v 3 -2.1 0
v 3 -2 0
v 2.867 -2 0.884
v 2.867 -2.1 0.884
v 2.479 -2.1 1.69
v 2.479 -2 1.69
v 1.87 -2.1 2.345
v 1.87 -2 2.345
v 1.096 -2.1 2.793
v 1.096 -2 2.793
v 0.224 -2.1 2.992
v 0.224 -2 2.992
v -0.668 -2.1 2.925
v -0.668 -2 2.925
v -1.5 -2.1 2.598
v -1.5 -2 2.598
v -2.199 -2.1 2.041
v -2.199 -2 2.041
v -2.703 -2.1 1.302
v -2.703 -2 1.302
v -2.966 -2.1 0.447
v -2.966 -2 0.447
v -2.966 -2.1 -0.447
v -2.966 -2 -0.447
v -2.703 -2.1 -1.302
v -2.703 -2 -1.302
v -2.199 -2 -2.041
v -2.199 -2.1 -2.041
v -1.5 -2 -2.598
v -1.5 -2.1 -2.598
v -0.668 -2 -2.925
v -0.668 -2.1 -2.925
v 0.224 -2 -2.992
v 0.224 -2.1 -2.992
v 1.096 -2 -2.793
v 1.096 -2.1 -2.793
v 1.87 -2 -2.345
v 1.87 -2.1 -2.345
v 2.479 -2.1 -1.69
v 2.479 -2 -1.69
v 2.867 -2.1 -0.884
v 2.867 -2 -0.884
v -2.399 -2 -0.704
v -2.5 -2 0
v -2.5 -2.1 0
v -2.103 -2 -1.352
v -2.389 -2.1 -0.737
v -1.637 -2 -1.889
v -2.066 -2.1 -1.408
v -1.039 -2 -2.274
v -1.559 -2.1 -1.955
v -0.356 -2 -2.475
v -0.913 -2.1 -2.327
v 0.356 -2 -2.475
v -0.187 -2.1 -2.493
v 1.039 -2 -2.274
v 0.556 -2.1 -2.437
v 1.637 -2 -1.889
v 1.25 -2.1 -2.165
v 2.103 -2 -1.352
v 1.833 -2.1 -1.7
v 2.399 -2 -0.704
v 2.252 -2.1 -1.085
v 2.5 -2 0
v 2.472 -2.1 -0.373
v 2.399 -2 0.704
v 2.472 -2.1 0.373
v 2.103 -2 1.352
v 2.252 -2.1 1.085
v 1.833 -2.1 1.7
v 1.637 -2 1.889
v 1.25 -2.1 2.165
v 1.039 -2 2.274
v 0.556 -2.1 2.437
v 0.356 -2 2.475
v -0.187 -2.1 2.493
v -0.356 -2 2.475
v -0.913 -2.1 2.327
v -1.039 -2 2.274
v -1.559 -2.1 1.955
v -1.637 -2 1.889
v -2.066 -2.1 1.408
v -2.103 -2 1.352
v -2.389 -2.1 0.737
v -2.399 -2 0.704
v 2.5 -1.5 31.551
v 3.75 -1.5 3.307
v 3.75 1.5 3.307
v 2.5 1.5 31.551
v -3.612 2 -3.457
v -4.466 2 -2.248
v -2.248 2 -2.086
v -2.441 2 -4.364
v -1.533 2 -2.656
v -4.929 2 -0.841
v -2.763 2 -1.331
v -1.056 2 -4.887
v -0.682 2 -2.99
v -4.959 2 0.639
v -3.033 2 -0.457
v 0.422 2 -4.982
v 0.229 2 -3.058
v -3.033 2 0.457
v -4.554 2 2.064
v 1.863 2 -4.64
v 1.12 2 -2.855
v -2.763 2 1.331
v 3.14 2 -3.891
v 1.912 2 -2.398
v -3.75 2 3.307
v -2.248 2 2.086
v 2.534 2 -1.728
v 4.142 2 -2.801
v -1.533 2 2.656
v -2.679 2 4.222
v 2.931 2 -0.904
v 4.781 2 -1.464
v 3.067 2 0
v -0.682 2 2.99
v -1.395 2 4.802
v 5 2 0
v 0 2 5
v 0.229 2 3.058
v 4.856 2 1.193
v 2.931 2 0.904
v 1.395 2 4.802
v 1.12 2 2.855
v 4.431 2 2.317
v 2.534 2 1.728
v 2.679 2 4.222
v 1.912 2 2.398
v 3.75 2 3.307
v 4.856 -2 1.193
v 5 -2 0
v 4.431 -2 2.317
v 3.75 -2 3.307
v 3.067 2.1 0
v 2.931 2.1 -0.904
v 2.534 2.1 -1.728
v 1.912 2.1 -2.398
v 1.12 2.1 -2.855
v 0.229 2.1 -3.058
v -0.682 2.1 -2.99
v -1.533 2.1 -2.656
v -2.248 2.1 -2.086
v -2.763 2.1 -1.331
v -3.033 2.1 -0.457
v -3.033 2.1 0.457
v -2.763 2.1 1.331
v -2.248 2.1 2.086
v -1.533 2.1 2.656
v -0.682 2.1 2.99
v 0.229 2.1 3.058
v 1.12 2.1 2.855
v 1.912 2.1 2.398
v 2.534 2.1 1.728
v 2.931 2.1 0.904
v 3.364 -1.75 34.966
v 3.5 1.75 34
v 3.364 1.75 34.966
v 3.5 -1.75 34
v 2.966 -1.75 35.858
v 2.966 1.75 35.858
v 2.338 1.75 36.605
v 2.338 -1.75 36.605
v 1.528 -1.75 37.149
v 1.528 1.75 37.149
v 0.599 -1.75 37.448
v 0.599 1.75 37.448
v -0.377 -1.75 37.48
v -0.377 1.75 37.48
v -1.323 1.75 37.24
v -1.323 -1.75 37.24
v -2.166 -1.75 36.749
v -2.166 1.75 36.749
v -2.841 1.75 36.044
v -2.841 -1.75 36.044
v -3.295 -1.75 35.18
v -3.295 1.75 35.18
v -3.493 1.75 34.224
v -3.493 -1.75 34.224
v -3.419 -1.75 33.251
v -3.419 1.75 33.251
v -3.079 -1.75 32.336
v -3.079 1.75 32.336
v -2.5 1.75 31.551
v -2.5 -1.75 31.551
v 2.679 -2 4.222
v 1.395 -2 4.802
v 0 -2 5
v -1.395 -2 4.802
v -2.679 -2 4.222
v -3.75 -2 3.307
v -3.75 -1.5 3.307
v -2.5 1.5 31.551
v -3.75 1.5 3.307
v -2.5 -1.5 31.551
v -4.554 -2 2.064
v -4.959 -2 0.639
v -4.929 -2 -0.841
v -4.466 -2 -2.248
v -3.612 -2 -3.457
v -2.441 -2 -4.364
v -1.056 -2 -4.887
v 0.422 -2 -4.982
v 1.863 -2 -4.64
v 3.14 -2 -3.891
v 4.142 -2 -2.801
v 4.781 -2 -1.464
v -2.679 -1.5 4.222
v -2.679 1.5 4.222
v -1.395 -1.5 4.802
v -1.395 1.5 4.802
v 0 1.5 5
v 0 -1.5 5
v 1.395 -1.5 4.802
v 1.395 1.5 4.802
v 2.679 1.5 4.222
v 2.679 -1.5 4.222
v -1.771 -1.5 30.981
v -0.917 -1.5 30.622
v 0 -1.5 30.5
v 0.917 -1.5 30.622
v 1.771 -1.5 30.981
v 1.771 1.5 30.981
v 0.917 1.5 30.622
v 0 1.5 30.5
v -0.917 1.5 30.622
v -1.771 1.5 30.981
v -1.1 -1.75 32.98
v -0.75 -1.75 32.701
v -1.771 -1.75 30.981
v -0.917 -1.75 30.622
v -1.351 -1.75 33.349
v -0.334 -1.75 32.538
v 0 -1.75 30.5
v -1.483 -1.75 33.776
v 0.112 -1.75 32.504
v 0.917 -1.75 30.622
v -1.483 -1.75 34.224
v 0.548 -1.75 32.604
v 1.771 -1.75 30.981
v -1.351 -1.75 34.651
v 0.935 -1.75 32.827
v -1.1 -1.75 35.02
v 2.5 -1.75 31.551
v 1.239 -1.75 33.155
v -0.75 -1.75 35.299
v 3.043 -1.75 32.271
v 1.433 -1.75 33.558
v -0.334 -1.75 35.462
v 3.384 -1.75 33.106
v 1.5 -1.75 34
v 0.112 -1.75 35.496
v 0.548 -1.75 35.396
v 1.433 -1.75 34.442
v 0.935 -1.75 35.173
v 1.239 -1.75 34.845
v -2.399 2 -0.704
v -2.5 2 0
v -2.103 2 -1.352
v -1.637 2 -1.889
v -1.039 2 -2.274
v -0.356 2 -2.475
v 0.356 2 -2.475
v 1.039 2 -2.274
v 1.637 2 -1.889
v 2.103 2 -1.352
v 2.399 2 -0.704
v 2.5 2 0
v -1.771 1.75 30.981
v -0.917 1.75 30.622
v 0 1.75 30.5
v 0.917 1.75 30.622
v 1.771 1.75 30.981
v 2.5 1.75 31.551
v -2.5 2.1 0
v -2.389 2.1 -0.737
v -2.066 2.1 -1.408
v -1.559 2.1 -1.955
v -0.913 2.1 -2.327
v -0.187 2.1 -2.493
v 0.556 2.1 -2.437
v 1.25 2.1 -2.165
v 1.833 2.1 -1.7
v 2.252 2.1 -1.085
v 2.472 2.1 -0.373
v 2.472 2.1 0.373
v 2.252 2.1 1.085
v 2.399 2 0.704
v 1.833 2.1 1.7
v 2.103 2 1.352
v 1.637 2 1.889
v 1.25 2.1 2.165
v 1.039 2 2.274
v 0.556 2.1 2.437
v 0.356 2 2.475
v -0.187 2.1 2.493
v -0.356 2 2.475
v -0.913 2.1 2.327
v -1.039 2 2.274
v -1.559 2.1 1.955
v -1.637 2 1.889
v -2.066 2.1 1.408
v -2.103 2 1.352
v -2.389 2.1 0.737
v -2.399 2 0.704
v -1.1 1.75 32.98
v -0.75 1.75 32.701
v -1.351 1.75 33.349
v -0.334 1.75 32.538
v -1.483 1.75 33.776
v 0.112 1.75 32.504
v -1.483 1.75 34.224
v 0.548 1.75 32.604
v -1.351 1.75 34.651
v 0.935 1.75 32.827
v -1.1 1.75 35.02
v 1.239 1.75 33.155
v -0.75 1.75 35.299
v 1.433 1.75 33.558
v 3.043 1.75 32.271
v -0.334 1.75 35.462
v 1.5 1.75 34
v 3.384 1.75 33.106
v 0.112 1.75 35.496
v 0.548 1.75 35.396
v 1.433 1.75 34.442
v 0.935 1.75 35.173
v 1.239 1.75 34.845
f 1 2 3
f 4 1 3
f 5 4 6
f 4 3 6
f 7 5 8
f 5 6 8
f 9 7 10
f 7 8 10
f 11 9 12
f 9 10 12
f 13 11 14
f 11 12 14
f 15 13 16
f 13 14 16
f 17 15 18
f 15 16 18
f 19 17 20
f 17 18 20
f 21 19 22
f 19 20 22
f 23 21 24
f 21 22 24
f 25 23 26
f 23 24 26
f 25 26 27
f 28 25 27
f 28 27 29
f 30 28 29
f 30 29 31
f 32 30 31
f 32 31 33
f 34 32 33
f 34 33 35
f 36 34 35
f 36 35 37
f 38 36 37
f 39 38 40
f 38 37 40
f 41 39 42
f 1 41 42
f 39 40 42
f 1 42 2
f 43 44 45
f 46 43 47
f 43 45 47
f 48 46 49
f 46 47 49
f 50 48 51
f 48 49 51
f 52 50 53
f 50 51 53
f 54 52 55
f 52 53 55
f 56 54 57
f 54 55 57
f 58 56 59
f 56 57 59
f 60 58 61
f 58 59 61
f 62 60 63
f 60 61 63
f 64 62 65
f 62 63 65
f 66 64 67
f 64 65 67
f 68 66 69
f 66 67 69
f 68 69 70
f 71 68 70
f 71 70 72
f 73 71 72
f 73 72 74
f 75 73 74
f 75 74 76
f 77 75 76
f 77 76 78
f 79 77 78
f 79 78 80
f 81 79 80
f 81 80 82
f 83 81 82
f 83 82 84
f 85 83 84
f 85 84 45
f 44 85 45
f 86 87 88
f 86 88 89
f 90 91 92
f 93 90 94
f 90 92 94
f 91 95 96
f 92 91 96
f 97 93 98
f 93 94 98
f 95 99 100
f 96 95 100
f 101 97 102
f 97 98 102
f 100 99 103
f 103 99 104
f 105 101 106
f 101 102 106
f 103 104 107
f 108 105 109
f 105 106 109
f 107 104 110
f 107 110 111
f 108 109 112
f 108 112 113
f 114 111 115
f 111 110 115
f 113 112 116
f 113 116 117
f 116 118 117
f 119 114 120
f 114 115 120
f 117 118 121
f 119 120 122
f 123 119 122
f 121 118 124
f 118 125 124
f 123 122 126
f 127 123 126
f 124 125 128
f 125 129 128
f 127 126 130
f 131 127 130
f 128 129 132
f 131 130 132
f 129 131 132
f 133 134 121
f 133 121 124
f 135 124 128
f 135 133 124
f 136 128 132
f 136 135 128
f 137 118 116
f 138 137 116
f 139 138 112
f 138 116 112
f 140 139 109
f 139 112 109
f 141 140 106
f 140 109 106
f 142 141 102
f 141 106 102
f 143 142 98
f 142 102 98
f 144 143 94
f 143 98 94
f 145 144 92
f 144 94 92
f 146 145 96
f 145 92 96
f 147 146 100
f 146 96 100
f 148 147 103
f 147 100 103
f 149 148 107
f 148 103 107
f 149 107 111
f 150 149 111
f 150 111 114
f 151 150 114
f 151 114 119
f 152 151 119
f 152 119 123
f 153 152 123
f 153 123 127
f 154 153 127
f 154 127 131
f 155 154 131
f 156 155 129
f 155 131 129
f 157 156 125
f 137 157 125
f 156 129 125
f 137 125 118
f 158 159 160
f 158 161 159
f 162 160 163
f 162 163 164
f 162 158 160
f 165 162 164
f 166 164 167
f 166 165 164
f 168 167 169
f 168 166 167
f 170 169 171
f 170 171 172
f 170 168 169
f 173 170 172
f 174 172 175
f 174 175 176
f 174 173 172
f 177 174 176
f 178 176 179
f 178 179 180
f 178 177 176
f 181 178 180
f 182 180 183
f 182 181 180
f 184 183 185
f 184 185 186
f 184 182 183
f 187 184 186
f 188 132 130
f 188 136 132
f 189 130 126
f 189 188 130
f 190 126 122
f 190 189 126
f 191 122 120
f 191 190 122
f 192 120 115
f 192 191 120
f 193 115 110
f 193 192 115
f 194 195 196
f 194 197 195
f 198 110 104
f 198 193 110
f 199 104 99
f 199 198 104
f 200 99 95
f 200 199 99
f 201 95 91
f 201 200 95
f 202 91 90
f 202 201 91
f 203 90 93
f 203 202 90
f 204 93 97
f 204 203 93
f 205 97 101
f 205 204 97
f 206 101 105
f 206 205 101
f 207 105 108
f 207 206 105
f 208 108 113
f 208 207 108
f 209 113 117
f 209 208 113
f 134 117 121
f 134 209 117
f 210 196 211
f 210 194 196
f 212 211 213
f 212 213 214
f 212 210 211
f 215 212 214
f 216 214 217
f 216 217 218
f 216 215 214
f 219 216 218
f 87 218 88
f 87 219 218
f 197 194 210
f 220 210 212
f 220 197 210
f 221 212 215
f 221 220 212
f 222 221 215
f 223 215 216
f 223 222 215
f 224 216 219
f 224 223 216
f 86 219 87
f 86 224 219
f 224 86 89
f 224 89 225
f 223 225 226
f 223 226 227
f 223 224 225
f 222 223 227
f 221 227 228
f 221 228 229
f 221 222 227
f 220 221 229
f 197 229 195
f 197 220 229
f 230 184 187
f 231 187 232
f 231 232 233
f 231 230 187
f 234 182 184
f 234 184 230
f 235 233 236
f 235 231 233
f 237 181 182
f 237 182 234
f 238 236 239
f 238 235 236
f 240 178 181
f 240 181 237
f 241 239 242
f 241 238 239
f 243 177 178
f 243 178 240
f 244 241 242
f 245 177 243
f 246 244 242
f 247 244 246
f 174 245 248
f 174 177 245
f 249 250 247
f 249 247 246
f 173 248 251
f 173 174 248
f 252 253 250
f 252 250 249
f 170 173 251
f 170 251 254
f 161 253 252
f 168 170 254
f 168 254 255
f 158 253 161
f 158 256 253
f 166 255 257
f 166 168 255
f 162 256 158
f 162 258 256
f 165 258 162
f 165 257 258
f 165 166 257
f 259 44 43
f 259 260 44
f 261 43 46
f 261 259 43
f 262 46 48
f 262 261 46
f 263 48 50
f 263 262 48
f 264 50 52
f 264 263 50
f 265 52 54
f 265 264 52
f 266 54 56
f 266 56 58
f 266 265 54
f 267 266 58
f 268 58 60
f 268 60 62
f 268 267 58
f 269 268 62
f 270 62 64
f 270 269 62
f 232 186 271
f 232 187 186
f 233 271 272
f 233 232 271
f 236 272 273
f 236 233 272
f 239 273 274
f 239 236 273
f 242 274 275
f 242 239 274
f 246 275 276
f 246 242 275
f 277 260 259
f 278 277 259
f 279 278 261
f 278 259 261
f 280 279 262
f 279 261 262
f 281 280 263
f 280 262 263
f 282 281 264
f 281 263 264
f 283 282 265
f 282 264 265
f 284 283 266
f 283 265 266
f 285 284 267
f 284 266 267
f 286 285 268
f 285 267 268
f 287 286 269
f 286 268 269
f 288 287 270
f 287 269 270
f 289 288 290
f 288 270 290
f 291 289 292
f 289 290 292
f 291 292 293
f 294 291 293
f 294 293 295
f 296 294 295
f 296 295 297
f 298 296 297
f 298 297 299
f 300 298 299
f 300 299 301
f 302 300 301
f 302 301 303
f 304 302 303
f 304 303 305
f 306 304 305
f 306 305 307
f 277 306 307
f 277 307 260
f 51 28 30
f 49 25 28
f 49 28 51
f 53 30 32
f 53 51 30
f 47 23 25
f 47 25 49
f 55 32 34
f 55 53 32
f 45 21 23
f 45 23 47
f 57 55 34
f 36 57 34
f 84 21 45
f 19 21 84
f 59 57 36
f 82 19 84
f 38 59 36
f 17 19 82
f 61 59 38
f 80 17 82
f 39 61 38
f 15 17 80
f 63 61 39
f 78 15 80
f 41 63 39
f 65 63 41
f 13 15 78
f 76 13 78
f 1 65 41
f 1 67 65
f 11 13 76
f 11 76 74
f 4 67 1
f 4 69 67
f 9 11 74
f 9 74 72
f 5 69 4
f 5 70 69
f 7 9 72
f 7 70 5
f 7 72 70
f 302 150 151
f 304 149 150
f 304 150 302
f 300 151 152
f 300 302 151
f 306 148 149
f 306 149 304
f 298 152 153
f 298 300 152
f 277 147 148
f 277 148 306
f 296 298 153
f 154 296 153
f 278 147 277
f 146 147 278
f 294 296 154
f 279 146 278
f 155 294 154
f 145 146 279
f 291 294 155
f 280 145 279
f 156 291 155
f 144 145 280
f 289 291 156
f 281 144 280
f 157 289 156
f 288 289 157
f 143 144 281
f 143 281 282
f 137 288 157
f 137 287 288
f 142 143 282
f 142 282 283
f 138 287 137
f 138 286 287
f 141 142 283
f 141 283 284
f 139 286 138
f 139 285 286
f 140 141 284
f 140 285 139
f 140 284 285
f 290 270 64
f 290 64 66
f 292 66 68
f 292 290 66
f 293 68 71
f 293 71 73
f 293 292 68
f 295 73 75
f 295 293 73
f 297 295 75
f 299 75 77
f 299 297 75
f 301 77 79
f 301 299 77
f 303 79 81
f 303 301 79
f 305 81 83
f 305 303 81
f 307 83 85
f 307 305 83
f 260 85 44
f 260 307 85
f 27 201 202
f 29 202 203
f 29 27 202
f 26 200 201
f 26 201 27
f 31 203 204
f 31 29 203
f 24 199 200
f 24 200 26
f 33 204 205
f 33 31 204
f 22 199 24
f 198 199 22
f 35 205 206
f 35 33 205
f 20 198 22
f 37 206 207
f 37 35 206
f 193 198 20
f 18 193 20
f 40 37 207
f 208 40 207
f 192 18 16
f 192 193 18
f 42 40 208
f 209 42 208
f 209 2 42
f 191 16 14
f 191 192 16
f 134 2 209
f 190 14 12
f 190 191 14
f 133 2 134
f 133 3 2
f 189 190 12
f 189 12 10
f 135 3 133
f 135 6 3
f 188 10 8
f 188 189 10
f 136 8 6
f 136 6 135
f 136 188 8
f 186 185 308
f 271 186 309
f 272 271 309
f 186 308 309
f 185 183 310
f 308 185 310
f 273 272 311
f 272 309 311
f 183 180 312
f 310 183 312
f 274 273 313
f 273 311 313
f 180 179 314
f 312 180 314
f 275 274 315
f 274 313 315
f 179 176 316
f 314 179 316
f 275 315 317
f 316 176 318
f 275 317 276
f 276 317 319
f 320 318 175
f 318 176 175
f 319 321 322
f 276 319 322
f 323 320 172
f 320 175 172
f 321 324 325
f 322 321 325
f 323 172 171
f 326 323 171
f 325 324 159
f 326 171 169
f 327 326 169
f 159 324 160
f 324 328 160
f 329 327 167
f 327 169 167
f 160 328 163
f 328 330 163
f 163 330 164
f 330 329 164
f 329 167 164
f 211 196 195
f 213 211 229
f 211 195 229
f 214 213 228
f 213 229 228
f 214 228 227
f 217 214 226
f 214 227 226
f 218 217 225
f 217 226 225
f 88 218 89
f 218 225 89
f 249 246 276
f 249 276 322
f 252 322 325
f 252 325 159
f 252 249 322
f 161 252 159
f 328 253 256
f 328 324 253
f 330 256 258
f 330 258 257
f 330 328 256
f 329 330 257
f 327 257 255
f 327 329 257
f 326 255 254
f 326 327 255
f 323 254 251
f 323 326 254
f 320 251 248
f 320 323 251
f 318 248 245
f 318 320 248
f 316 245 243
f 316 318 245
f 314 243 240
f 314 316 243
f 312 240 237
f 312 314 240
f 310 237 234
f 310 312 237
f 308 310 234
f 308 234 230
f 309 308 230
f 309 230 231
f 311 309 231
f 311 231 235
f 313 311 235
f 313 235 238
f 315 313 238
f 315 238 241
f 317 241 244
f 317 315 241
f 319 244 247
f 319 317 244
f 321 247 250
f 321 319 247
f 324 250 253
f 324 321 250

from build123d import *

# Parameters (mm, degrees)
F0_R      = 1.5
F1_DEPTH  = 1.75
F0_R_2    = 3.25
F2_DEPTH  = 2
F0_R_3    = 2.5
F3_DEPTH  = 2
F4_DEPTH  = 1.5
F7_R      = 3
F10_DEPTH = 0.1
F9_R      = 3.066876
F11_DEPTH = 0.1
F12_D     = 5
F12_DEPTH = 5
F14_D     = 5
F14_DEPTH = 5


with BuildPart() as f1:
    # F0 (on Front) → F1 (new body, symmetric)
    with BuildSketch(Plane.XZ):
        with BuildLine():
            ThreePointArc((-2.5, 31.55051), (0, 30.5), (2.5, 31.55051))
            ThreePointArc((2.5, 31.55051), (3.24037, 32.677124), (3.5, 34))
            ThreePointArc((3.5, 34), (-1.322876, 37.24037), (-2.5, 31.55051))
        make_face()
        with Locations((0, 34)):
            Circle(F0_R, mode=Mode.SUBTRACT)
    extrude(amount=F1_DEPTH, both=True)


with BuildPart() as f2:
    # F0 (on Front) → F2 (new body, symmetric)
    with BuildSketch(Plane.XZ):
        with BuildLine():
            ThreePointArc((-3.75, 3.307189), (-1.767767, -4.677072), (5, 0))
            ThreePointArc((5, 0), (4.677072, 1.767767), (3.75, 3.307189))
            ThreePointArc((3.75, 3.307189), (0, 5), (-3.75, 3.307189))
        make_face()
        Circle(F0_R_2, mode=Mode.SUBTRACT)
    extrude(amount=F2_DEPTH, both=True)

    # F0 (on Front) → F3 (join, symmetric)
    with BuildSketch(Plane.XZ):
        Circle(F0_R_2)
        Circle(F0_R_3, mode=Mode.SUBTRACT)
    extrude(amount=F3_DEPTH, both=True)

    # F7 (on offset) → F10 (join)
    with BuildSketch(Plane.XZ.offset(2)):
        Circle(F7_R)
    extrude(amount=F10_DEPTH)

    # F9 (on offset) → F11 (join)
    with BuildSketch(Plane(origin=(0, 2, 0), x_dir=(1, 0, 0), z_dir=(0, 1, 0))):
        Circle(F9_R)
    extrude(amount=F11_DEPTH)

    # F12
    with Locations(Plane(origin=(0, 0, 0), x_dir=(1, 0, 0), z_dir=(0, 1, 0))):
        with Locations((0, 0)):
            Hole(F12_D / 2, depth=F12_DEPTH)

    # F14
    with Locations(Plane.XZ.offset(-2)):
        with Locations((0, 0)):
            Hole(F14_D / 2, depth=F14_DEPTH)


with BuildPart() as f4:
    # F0 (on Front) → F4 (new body, symmetric)
    with BuildSketch(Plane.XZ):
        with BuildLine():
            ThreePointArc((-3.75, 3.307189), (0, 5), (3.75, 3.307189))
            Line((3.75, 3.307189), (2.5, 31.55051))
            ThreePointArc((2.5, 31.55051), (0, 30.5), (-2.5, 31.55051))
            Line((-2.5, 31.55051), (-3.75, 3.307189))
        make_face()
    extrude(amount=F4_DEPTH, both=True)


solid = Compound([f1.part, f2.part, f4.part])
